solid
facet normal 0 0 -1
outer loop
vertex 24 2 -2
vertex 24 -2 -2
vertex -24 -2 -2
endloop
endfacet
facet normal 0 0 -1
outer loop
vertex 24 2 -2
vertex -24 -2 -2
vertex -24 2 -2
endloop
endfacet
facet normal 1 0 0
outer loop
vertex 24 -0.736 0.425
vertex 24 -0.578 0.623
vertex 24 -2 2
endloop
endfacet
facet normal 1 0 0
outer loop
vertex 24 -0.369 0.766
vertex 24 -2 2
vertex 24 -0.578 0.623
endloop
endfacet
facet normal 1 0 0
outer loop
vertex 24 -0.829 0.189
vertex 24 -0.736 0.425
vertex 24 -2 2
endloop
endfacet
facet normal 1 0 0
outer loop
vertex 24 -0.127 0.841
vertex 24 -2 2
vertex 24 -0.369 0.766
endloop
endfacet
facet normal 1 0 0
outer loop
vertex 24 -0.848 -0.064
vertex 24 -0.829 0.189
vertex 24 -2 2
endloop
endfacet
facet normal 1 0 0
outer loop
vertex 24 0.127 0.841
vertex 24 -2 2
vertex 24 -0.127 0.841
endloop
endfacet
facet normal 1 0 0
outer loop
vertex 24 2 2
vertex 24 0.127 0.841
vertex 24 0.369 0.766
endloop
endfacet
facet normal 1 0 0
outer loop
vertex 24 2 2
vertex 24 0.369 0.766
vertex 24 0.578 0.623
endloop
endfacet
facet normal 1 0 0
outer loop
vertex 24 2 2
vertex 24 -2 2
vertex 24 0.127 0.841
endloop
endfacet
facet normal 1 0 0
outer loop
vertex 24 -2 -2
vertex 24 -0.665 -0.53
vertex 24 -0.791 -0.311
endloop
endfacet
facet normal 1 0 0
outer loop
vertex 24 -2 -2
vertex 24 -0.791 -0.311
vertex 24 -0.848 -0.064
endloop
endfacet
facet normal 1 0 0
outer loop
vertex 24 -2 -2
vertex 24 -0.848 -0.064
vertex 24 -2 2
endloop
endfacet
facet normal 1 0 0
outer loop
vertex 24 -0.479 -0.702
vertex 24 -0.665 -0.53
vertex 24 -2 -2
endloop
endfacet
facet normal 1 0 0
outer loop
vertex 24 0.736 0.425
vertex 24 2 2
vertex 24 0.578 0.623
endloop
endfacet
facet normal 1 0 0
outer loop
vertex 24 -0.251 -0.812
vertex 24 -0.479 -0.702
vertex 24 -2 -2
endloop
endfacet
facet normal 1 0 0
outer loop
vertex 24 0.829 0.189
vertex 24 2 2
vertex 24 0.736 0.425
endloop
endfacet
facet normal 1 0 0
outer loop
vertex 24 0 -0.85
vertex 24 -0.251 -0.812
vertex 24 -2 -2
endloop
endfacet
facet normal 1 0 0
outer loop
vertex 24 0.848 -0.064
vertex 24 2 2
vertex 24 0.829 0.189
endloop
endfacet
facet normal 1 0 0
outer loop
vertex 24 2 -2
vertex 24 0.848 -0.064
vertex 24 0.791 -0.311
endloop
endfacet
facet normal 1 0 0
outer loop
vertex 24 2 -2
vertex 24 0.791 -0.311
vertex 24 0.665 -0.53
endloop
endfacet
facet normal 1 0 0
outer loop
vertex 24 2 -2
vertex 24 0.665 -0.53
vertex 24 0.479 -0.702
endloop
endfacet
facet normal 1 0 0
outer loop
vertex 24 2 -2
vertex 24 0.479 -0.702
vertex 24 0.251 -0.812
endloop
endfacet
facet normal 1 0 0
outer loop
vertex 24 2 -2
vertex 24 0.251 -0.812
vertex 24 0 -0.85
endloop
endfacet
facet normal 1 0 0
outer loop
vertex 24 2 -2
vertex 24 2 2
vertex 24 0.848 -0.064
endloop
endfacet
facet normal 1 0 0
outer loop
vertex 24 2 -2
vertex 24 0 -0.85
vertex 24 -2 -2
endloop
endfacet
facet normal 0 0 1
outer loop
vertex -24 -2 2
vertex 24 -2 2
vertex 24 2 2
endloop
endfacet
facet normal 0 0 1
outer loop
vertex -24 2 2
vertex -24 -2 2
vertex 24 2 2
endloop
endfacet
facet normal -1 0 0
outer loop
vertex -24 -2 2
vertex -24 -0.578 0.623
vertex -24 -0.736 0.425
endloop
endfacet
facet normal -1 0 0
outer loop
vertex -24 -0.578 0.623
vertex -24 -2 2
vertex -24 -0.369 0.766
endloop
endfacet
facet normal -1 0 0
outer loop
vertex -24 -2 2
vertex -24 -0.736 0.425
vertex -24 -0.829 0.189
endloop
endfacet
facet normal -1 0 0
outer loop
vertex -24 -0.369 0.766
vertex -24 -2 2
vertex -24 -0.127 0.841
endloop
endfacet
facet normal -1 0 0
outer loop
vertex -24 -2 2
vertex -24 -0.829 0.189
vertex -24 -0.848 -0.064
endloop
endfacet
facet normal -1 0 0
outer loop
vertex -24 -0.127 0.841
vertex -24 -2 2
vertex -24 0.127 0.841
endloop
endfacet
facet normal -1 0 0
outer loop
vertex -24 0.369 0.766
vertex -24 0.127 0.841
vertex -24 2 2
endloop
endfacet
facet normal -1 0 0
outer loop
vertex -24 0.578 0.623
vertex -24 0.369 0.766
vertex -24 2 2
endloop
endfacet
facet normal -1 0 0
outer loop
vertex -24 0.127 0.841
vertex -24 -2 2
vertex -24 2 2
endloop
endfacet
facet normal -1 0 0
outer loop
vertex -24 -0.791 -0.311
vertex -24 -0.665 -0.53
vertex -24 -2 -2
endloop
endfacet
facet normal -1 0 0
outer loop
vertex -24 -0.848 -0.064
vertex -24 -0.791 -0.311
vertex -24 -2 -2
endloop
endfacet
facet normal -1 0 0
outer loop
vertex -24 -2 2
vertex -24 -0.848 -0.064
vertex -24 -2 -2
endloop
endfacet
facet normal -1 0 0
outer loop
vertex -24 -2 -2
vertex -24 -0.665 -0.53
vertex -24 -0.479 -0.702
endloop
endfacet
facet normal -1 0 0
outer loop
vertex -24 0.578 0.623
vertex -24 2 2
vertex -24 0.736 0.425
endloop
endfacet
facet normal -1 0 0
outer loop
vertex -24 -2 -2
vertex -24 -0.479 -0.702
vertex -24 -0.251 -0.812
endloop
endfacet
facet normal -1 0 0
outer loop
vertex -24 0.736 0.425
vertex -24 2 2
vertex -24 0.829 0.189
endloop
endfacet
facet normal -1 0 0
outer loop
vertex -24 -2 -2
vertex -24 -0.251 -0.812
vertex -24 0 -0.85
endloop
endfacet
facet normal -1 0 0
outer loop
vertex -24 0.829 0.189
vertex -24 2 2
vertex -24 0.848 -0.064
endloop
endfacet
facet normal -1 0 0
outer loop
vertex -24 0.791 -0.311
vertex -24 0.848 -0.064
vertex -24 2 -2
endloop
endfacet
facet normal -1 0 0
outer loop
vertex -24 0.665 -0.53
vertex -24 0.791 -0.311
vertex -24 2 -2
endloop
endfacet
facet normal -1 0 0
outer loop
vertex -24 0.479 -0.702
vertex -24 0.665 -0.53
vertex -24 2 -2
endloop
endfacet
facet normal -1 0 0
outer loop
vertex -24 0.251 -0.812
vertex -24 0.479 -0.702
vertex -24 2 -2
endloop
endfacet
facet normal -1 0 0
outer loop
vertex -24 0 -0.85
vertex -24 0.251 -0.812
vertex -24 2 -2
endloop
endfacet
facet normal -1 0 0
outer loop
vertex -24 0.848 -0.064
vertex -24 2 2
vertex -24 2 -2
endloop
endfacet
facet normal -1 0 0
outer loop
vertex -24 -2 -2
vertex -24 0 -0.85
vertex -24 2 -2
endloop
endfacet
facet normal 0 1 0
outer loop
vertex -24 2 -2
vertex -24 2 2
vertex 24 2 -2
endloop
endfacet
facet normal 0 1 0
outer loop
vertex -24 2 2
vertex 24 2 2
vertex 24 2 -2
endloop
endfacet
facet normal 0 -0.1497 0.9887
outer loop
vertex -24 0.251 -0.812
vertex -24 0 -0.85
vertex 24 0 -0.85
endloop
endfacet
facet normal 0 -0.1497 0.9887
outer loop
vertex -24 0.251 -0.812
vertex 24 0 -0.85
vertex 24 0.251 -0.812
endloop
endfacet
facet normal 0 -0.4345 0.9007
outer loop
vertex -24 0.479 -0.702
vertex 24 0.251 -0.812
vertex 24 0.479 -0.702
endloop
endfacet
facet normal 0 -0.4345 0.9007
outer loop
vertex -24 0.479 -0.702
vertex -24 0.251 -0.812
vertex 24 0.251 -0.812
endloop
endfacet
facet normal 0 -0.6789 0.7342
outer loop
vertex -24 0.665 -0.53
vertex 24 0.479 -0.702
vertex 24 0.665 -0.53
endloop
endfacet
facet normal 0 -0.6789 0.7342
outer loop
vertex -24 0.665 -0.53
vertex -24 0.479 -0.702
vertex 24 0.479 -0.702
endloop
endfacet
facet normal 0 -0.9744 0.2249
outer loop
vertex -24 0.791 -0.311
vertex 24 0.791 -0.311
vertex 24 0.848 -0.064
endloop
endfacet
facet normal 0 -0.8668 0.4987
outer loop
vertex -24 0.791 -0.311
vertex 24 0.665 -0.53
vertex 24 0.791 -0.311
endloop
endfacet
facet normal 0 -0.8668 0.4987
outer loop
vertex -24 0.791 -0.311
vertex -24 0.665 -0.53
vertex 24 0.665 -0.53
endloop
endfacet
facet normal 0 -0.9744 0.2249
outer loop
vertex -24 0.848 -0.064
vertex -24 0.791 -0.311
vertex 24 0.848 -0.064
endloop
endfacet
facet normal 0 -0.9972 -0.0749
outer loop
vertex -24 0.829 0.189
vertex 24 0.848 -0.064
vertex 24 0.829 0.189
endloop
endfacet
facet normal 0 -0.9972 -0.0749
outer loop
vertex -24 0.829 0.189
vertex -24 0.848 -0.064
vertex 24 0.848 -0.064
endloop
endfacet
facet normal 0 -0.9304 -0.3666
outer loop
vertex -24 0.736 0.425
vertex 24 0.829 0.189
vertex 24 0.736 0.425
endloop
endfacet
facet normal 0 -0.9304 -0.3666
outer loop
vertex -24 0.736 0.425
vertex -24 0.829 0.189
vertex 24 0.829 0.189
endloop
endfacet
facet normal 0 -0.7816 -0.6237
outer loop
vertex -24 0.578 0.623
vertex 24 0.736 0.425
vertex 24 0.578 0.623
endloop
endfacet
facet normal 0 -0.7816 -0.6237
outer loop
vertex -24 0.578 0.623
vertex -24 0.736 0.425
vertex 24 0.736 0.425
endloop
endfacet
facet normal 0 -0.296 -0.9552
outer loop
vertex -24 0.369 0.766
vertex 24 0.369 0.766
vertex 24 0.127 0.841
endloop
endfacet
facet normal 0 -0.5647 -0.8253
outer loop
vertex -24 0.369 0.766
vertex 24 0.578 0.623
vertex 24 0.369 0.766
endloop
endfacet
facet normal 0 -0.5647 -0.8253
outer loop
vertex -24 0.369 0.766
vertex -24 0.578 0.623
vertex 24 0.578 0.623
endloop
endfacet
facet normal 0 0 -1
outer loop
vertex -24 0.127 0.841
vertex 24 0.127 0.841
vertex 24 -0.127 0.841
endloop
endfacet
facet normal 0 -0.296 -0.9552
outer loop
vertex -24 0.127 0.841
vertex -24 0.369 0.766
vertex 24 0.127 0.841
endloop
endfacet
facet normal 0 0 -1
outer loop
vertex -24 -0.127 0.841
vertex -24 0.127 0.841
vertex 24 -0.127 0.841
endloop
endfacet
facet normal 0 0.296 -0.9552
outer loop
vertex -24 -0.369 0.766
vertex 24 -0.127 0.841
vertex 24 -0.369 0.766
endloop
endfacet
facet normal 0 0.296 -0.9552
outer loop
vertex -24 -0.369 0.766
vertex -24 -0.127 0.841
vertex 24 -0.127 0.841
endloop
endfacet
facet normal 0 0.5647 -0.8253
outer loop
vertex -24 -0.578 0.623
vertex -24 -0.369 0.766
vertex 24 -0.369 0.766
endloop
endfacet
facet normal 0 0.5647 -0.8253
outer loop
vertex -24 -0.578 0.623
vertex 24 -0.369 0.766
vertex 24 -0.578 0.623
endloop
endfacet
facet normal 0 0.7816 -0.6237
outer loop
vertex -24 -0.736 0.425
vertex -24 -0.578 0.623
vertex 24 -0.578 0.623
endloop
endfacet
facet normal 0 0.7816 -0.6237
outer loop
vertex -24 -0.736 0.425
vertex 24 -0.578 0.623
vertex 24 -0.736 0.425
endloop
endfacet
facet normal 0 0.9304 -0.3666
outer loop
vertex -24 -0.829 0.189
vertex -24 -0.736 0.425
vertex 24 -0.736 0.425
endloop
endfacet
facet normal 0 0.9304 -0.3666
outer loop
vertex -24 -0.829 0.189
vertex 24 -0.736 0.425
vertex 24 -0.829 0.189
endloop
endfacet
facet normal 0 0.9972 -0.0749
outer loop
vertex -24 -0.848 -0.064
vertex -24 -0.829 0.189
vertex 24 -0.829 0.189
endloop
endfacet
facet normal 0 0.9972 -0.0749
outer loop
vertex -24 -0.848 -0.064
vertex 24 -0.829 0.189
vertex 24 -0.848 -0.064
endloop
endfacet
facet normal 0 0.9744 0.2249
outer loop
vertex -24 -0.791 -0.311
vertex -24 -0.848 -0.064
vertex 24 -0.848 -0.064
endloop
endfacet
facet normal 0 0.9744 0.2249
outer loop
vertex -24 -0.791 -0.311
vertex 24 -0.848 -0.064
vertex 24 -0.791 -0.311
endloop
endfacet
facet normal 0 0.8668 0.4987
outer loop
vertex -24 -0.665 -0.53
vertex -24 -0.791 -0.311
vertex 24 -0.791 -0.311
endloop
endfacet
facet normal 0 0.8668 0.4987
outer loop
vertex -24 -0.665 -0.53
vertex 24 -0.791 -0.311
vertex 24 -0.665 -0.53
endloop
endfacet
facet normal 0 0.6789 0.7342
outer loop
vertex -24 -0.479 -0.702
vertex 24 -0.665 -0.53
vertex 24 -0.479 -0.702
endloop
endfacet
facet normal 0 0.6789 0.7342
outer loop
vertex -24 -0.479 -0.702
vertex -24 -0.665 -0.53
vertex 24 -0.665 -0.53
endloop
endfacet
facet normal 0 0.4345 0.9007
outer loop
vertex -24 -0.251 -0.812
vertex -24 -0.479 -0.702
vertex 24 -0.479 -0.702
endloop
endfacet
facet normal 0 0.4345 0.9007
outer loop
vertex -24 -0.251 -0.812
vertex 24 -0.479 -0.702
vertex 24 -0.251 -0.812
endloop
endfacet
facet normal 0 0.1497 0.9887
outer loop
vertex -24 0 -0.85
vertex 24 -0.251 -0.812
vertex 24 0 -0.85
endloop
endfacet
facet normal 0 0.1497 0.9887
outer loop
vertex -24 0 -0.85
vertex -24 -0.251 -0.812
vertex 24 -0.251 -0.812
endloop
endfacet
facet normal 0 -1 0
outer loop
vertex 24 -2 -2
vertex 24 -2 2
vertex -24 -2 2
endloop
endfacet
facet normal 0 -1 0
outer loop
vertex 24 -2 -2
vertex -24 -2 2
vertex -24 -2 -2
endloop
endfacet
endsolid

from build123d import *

# Parameters (mm, degrees)
ESBO_O1_W                  = 4
ESBO_O1_H                  = 4
RESSALTO_EXTRUS_O1_DEPTH   = 24
CORTE_EXTRUS_O1_DEPTH      = 49.083261121
CORTE_EXTRUS_O1_DEPTH_BACK = 49.083261121
ESBO_O2_R                  = 0.85


with BuildPart() as part:
    # Esboço1 → Ressalto-extrusão1 (new, symmetric)
    with BuildSketch(Plane(origin=(0, 0, 0), x_dir=(0, 0, -1), z_dir=(1, 0, 0))):
        Rectangle(ESBO_O1_W, ESBO_O1_H)
    extrude(amount=RESSALTO_EXTRUS_O1_DEPTH, both=True)

    # Esboço2 → Corte-extrusão1 (cut, two sides: drawn at the far end of the back side and taken through both)
    with BuildSketch(Plane(origin=(24, 0, 0), x_dir=(0, 0, -1), z_dir=(1, 0, 0)).offset(-CORTE_EXTRUS_O1_DEPTH_BACK)):
        Circle(ESBO_O2_R)
    extrude(amount=CORTE_EXTRUS_O1_DEPTH + CORTE_EXTRUS_O1_DEPTH_BACK, mode=Mode.SUBTRACT)


solid = part.part
